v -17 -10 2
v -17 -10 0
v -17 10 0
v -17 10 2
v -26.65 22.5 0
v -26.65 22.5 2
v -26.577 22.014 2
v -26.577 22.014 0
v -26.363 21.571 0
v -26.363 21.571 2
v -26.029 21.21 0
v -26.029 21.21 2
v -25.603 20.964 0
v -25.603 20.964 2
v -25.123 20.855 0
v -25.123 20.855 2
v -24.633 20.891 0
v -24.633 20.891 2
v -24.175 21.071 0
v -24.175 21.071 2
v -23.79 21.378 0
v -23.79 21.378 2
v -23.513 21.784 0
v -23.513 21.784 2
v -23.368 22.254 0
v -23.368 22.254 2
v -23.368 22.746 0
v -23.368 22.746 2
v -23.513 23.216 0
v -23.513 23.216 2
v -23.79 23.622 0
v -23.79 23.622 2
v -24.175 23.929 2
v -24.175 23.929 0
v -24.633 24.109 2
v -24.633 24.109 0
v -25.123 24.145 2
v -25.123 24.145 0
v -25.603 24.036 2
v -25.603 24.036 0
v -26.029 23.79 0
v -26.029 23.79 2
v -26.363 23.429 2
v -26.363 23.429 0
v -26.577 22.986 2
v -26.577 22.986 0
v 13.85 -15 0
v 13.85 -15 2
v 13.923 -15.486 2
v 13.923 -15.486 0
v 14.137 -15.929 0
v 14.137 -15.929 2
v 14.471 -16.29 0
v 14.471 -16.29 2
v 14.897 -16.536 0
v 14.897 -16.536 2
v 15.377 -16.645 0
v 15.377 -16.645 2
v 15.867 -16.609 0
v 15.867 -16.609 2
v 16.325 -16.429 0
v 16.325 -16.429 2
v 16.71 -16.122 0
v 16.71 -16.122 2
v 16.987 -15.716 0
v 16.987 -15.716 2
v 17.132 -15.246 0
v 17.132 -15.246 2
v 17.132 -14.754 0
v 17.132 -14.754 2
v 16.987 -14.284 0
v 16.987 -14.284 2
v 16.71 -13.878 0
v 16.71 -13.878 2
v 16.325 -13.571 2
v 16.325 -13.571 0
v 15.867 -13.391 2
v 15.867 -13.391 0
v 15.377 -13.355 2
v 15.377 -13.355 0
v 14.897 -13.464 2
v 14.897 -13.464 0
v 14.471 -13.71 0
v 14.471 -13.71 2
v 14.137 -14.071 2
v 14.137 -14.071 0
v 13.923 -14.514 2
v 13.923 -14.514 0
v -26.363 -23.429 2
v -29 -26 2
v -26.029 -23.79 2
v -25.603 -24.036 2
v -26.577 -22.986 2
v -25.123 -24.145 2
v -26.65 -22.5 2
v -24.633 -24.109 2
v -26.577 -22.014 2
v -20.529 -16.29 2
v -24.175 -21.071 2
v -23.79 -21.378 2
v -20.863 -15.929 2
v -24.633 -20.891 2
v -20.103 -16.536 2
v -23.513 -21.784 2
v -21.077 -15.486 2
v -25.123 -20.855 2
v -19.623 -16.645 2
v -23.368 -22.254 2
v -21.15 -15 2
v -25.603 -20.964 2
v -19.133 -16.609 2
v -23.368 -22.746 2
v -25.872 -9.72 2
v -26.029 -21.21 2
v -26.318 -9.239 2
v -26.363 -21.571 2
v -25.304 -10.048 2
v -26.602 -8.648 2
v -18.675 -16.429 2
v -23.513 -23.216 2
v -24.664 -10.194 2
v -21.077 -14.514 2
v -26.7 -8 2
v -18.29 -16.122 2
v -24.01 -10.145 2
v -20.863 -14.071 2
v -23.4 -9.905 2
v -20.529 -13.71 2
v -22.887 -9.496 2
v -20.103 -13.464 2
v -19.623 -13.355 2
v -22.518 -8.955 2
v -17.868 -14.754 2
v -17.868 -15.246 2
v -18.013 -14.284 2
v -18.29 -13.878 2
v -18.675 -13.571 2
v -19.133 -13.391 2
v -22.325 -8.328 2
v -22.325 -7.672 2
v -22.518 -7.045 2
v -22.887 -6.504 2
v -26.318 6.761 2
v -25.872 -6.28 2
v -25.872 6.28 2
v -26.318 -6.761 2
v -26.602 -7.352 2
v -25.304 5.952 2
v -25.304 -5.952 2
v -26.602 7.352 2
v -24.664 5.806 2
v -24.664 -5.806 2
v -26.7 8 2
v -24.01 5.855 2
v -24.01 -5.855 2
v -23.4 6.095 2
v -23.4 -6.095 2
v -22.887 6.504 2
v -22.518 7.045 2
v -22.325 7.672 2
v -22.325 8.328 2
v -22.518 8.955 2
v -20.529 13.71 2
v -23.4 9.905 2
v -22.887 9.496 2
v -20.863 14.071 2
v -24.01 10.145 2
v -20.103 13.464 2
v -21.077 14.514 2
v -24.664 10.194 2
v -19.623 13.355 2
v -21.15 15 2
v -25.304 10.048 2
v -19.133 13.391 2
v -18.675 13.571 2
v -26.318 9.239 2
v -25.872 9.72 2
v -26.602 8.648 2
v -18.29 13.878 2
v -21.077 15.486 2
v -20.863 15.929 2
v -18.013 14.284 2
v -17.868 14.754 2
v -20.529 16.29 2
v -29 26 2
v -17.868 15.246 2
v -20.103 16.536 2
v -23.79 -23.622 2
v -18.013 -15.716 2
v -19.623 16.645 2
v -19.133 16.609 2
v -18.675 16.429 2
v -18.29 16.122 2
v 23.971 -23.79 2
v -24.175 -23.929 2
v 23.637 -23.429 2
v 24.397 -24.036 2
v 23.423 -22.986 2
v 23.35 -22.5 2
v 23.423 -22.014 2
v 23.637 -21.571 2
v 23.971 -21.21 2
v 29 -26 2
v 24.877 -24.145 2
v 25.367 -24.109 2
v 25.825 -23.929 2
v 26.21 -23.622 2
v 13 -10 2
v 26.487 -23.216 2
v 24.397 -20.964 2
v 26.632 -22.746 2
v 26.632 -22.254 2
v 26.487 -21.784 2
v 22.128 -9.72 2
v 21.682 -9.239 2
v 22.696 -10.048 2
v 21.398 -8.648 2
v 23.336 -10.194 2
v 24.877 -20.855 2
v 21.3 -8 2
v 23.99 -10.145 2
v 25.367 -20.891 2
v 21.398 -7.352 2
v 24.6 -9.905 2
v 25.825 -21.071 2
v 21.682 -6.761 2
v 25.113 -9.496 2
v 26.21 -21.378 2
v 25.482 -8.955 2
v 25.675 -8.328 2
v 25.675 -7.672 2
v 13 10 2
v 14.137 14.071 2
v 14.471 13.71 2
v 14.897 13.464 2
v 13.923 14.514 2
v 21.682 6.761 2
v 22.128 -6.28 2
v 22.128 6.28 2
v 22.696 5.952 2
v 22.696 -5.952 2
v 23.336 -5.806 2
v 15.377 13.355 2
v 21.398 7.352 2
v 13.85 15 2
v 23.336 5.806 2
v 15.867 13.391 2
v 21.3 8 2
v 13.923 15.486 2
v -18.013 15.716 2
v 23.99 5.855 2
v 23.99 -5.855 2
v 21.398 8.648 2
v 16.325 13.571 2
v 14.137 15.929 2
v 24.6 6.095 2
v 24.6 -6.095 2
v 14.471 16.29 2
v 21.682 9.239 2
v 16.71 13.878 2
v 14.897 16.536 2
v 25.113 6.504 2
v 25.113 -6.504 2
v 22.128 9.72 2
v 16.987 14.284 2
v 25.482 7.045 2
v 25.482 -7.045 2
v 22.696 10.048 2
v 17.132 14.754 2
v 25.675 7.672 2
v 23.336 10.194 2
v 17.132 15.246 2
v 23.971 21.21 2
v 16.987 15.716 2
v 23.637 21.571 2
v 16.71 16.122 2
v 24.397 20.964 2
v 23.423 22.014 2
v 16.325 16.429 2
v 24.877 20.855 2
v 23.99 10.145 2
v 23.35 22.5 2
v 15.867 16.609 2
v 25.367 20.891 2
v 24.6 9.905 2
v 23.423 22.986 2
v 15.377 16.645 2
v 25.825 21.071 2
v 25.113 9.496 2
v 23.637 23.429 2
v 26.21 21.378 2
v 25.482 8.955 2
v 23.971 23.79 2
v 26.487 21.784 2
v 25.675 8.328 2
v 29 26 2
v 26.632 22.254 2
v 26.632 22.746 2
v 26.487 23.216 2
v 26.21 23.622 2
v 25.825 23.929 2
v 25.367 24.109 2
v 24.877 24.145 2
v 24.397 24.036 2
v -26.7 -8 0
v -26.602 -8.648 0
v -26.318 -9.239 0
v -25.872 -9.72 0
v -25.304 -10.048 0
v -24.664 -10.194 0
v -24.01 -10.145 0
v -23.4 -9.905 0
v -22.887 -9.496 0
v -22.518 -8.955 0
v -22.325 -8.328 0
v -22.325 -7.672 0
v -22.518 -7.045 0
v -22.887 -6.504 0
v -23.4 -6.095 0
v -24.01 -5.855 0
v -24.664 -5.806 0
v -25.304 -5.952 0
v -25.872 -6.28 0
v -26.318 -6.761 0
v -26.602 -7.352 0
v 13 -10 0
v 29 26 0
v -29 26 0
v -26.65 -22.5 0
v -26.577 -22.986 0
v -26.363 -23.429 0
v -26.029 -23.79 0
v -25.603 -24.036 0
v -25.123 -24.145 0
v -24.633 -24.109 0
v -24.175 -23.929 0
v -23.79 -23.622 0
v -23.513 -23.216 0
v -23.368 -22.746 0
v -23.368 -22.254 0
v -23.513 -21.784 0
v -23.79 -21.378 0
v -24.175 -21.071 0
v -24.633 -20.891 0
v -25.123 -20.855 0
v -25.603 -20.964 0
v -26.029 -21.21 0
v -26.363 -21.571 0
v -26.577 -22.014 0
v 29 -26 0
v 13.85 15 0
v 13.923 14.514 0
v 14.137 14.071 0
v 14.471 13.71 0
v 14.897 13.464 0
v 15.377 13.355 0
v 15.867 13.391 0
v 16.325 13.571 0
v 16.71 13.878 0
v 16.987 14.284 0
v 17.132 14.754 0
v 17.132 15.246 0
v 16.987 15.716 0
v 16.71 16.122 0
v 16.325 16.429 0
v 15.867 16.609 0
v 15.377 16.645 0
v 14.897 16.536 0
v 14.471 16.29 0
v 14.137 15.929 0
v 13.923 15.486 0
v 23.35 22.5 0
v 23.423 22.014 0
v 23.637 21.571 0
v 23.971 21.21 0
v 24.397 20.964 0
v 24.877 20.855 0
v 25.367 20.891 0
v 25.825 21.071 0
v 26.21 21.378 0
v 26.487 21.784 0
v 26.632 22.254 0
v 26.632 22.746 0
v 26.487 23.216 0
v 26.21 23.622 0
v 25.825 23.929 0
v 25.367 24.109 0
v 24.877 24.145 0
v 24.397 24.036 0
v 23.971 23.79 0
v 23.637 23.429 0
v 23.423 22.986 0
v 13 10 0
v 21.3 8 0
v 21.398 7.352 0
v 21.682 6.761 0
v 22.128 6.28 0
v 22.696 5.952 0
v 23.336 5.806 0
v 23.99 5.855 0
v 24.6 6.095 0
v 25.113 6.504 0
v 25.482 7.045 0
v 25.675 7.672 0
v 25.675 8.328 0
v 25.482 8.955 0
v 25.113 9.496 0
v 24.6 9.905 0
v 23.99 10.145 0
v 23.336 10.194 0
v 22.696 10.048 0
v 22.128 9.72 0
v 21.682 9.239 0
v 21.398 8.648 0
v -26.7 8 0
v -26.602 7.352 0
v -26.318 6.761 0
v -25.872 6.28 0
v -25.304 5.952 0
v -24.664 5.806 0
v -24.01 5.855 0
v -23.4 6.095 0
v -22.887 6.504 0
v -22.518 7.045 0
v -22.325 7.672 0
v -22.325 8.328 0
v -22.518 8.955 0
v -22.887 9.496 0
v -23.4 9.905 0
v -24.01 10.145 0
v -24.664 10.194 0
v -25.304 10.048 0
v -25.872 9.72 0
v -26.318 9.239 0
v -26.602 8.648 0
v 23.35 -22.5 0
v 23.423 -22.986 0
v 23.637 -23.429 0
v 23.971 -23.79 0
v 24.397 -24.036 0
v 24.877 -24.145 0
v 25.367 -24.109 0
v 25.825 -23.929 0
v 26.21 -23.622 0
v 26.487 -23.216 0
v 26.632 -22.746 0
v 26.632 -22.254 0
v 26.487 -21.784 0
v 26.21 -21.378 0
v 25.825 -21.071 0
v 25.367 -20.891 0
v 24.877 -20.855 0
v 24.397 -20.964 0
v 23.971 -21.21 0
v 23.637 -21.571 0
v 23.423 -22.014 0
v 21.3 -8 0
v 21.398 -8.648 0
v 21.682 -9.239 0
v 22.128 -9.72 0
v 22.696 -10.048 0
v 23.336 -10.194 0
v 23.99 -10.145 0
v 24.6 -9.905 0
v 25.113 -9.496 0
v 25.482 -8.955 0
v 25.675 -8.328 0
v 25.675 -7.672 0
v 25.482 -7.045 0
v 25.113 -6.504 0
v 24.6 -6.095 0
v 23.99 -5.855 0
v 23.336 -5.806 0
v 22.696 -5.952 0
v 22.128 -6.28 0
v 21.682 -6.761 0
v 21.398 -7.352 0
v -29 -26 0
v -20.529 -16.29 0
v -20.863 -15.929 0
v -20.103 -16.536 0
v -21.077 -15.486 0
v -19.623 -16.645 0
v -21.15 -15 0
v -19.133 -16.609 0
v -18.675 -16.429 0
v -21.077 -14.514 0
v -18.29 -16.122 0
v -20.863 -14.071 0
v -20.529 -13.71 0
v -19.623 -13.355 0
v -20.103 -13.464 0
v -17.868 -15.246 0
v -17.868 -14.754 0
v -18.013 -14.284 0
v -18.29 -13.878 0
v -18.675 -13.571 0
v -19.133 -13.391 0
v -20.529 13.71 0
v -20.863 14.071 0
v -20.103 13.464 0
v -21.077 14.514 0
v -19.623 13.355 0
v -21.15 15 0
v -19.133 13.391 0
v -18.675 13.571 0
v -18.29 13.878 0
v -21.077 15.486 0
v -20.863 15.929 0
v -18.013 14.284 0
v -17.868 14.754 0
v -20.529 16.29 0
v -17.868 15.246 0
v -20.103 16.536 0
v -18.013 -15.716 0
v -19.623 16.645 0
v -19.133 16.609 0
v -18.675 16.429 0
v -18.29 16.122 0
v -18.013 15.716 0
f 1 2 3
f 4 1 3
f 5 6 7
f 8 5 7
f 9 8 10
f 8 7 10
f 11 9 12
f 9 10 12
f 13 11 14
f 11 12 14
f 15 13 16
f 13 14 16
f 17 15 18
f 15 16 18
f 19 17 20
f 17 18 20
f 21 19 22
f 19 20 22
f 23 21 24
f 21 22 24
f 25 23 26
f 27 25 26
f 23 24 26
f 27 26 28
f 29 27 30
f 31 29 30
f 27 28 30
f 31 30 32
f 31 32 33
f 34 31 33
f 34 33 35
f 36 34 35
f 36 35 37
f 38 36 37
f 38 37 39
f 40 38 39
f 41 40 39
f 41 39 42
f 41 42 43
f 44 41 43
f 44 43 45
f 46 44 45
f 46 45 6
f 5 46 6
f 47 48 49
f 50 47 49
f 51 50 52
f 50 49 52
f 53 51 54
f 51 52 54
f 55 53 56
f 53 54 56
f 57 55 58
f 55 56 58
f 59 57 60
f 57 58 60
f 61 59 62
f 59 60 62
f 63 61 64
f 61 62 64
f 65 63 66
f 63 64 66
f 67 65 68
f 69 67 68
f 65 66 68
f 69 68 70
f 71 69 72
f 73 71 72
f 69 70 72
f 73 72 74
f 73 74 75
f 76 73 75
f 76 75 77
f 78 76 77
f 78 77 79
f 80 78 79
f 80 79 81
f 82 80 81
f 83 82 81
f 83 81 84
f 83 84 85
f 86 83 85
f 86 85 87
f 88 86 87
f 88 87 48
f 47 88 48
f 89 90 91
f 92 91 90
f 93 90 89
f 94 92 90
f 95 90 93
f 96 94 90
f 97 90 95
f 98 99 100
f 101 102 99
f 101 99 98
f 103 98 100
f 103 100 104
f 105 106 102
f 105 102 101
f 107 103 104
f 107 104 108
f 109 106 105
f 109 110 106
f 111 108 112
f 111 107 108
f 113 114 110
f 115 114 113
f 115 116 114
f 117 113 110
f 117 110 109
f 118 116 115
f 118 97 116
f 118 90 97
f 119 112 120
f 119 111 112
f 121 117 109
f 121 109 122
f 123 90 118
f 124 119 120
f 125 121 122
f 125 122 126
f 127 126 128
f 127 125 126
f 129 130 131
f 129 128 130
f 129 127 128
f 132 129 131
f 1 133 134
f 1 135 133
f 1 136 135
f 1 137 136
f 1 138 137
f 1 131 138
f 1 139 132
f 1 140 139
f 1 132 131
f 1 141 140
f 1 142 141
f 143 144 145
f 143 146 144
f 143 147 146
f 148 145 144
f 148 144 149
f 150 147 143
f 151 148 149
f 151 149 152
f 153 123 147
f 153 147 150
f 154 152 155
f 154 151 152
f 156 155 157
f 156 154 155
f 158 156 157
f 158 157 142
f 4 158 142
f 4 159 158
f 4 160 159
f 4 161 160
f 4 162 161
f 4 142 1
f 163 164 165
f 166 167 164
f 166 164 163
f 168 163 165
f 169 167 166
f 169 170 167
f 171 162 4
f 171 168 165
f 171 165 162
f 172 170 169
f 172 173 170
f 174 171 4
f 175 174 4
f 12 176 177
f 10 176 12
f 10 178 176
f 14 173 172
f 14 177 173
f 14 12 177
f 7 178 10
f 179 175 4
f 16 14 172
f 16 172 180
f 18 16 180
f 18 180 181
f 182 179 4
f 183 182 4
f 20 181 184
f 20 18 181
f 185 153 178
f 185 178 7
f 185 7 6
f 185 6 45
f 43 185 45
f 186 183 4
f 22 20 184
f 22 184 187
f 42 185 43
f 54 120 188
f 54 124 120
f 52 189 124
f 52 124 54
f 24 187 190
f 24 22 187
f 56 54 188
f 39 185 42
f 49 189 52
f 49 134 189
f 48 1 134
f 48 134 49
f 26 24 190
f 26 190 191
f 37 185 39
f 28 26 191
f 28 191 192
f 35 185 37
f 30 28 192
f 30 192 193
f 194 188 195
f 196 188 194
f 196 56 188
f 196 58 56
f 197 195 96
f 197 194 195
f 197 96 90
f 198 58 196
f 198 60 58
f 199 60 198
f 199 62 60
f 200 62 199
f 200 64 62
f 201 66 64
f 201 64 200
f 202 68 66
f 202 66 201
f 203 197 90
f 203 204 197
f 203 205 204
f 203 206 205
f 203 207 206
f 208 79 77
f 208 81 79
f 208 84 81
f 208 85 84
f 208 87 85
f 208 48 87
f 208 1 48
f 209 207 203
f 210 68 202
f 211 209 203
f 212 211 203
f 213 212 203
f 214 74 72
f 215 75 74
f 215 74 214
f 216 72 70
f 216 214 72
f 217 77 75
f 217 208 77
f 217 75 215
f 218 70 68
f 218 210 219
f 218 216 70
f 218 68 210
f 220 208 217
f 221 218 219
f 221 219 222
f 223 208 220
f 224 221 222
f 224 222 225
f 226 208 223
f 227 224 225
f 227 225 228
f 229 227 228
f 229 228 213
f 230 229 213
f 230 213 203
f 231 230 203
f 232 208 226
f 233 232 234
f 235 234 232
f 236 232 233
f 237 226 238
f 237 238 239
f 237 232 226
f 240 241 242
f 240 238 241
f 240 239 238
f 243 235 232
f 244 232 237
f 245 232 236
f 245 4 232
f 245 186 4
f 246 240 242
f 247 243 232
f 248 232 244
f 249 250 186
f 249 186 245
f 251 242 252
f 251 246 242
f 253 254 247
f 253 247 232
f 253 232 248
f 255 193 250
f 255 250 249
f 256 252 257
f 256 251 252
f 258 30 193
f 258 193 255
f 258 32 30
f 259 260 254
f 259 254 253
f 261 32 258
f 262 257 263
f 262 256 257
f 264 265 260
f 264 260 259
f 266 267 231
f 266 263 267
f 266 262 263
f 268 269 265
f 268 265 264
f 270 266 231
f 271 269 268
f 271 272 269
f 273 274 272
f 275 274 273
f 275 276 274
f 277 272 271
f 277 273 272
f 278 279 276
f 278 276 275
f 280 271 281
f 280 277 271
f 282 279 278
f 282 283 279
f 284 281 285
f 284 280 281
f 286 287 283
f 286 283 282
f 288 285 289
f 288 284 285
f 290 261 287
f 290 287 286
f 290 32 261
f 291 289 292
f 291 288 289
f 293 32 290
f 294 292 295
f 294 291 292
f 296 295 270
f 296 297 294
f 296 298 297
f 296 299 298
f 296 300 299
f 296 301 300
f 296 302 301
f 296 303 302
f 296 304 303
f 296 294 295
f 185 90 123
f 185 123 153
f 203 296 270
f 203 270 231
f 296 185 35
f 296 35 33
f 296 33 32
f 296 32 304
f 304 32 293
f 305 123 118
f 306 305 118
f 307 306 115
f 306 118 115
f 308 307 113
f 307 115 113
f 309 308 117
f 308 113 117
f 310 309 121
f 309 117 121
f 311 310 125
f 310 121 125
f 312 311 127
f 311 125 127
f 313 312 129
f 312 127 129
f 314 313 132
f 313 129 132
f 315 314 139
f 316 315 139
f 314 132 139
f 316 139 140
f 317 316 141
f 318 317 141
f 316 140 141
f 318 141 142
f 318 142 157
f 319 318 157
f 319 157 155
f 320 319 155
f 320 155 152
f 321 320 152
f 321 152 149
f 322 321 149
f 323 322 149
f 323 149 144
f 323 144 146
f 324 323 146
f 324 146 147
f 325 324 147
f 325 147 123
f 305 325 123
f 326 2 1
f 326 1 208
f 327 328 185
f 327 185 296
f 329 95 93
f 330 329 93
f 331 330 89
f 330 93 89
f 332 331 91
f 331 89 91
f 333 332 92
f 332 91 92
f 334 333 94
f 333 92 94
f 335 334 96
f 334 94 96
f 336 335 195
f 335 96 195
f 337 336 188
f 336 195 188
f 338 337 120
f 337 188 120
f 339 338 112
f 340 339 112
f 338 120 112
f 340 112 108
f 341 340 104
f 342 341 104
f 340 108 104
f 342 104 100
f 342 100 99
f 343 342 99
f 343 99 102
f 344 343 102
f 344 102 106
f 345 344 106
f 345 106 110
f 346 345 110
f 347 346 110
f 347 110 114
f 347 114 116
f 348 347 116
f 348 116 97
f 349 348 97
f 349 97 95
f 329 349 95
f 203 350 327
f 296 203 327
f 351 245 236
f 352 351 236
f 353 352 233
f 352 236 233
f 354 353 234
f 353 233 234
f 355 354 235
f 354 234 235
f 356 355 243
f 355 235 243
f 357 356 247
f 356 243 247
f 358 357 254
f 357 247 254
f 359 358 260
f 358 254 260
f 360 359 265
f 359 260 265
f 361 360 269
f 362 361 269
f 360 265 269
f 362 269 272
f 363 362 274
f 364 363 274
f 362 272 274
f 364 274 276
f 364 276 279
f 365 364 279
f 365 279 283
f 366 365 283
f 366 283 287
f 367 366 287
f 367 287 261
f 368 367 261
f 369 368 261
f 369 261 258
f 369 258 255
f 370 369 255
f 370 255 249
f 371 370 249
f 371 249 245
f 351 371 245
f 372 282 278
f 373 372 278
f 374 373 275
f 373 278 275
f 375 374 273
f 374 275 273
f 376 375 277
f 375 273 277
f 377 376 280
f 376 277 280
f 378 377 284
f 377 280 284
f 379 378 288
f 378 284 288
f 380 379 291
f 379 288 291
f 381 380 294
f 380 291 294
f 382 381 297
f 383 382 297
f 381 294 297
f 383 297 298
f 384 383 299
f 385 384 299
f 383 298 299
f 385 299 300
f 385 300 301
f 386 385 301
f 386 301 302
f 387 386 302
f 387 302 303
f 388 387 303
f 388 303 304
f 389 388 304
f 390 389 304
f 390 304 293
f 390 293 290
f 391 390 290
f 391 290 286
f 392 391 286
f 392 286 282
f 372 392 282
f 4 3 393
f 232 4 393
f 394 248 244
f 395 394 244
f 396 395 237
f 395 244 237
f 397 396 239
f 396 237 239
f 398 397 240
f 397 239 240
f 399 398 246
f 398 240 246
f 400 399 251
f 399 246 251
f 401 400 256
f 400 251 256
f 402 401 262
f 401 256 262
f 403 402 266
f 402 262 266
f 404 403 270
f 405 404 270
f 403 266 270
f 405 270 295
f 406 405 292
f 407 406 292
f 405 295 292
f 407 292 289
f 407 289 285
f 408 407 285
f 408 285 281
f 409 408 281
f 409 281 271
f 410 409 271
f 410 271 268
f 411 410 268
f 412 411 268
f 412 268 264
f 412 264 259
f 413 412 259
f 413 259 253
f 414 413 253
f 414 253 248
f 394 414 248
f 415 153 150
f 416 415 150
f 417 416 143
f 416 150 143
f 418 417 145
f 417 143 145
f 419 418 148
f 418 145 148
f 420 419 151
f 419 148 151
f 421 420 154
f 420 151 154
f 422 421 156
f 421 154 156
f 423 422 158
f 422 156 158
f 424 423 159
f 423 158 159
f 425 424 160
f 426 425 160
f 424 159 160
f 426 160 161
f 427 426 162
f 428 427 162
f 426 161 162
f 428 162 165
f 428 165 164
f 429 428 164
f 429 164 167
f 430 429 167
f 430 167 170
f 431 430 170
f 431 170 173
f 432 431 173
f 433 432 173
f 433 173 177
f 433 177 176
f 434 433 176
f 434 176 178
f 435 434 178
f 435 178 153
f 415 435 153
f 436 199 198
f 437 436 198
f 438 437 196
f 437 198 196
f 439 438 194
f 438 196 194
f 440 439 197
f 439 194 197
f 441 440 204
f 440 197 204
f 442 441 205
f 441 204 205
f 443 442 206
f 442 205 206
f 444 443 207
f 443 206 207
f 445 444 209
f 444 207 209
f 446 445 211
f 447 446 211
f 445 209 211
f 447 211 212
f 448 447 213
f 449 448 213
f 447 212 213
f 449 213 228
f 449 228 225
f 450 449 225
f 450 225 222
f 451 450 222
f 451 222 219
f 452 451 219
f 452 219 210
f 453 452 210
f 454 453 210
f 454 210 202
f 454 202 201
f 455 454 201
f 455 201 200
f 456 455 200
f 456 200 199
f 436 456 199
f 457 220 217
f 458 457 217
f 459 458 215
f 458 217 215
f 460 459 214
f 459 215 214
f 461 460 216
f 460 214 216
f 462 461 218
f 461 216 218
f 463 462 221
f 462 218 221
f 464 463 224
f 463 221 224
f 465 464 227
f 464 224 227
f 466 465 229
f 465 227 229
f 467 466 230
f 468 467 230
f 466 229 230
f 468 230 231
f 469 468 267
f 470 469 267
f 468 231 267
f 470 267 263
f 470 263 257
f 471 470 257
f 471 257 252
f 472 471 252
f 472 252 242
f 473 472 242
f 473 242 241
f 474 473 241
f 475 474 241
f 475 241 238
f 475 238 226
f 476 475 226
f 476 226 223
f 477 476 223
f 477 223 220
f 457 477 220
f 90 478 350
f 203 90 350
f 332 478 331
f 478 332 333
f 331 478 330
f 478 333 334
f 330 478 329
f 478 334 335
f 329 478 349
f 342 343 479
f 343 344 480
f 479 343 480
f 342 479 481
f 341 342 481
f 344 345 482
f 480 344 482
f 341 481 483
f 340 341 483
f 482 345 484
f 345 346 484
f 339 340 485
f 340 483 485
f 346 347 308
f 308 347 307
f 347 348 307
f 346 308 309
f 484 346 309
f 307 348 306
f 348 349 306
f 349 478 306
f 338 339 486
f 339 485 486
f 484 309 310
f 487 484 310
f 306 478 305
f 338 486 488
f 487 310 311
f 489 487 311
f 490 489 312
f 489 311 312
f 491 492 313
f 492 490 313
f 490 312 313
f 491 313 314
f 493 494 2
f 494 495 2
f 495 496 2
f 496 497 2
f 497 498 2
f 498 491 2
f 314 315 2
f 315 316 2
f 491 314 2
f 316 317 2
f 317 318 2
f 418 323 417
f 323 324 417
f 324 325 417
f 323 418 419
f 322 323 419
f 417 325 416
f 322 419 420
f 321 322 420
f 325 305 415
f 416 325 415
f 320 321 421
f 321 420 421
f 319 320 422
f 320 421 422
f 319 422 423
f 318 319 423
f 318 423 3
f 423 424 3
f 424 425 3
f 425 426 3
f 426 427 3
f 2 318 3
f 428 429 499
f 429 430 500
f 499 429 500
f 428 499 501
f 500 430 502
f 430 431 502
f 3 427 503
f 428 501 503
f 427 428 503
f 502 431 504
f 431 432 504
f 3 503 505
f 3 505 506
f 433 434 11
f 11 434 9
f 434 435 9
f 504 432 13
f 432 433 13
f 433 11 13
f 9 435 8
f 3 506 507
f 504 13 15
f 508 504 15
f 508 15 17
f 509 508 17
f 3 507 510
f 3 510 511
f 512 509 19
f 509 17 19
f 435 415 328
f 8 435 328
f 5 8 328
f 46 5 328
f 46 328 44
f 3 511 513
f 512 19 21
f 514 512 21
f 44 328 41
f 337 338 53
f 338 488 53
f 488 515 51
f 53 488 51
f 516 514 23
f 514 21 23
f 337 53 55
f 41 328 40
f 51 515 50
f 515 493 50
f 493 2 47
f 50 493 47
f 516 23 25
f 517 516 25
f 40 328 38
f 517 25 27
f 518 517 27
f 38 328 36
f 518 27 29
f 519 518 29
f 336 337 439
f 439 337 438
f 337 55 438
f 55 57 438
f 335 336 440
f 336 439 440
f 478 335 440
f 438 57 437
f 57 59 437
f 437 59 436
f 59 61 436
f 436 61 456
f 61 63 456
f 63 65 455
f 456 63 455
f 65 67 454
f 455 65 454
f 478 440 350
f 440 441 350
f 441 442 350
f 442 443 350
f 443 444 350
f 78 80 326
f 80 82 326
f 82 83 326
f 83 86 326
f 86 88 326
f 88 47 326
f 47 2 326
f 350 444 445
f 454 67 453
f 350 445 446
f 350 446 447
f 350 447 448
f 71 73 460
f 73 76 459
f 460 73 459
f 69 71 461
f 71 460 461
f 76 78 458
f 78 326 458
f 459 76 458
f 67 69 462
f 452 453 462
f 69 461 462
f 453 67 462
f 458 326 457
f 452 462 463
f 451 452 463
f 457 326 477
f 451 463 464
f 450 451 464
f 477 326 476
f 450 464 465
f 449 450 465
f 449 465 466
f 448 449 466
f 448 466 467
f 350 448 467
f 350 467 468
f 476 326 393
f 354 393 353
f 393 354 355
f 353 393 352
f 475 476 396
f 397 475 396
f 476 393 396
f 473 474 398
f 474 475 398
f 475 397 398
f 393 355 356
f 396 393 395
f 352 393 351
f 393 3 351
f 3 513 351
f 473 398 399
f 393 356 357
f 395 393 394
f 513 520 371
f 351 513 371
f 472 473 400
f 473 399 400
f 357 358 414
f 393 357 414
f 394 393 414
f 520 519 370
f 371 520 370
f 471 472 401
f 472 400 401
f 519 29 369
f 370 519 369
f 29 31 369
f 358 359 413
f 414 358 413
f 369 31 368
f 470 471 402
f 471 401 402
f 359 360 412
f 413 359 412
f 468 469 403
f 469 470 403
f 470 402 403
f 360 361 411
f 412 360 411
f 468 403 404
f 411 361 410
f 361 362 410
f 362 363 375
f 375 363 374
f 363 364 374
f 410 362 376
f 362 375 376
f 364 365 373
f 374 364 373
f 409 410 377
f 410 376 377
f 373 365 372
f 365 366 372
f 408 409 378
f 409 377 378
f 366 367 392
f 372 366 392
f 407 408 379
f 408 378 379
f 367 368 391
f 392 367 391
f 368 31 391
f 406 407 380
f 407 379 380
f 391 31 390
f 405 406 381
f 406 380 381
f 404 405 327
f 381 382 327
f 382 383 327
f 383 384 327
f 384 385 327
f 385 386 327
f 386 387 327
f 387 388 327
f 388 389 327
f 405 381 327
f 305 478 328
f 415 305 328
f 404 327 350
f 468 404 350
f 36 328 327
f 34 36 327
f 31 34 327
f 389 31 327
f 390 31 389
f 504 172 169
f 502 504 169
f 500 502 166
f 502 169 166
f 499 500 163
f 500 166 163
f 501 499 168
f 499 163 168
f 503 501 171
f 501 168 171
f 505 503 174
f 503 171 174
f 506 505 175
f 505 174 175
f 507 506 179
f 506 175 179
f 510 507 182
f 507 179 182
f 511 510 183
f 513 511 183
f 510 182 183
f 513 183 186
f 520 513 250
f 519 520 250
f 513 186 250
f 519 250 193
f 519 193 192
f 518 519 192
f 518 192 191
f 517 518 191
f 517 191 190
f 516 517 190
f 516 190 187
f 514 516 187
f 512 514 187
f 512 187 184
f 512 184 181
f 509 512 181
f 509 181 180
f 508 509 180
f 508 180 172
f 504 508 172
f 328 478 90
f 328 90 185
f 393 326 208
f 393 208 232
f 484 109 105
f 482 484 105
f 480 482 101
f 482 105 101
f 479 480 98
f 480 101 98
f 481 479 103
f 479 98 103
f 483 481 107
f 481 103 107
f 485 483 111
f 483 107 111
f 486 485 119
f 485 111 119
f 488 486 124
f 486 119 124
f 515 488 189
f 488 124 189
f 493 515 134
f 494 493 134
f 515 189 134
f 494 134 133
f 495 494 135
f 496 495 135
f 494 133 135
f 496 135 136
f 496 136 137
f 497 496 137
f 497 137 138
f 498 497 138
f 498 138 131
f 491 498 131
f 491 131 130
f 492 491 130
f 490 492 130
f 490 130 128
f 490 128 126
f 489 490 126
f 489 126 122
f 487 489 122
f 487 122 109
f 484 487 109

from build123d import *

# Parameters (mm, degrees)
F0_W     = 58
F0_H     = 52
F0_W_2   = 30
F0_H_2   = 20
F1_DEPTH = 2
F2_D     = 3.3
F3_D     = 4.4


with BuildPart() as f1:
    # F0 (on Top) → F1 (new body)
    with BuildSketch(Plane.XY):
        Rectangle(F0_W, F0_H)
        with Locations((-2, 0)):
            Rectangle(F0_W_2, F0_H_2, mode=Mode.SUBTRACT)
    extrude(amount=F1_DEPTH)

    # F2 (through all)
    with Locations(Plane(origin=(0, 0, 0), x_dir=(1, 0, 0), z_dir=(0, 0, -1))):
        with Locations((-19.5, 15), (-25, 22.5), (-19.5, -15), (-25, -22.5), (15.5, 15), (15.5, -15), (25, -22.5), (25, 22.5)):
            Hole(F2_D / 2)

    # F3 (through all)
    with Locations(Plane(origin=(0, 0, 0), x_dir=(1, 0, 0), z_dir=(0, 0, -1))):
        with Locations((-24.5, 8), (-24.5, -8), (23.5, 8), (23.5, -8)):
            Hole(F3_D / 2)


solid = f1.part
